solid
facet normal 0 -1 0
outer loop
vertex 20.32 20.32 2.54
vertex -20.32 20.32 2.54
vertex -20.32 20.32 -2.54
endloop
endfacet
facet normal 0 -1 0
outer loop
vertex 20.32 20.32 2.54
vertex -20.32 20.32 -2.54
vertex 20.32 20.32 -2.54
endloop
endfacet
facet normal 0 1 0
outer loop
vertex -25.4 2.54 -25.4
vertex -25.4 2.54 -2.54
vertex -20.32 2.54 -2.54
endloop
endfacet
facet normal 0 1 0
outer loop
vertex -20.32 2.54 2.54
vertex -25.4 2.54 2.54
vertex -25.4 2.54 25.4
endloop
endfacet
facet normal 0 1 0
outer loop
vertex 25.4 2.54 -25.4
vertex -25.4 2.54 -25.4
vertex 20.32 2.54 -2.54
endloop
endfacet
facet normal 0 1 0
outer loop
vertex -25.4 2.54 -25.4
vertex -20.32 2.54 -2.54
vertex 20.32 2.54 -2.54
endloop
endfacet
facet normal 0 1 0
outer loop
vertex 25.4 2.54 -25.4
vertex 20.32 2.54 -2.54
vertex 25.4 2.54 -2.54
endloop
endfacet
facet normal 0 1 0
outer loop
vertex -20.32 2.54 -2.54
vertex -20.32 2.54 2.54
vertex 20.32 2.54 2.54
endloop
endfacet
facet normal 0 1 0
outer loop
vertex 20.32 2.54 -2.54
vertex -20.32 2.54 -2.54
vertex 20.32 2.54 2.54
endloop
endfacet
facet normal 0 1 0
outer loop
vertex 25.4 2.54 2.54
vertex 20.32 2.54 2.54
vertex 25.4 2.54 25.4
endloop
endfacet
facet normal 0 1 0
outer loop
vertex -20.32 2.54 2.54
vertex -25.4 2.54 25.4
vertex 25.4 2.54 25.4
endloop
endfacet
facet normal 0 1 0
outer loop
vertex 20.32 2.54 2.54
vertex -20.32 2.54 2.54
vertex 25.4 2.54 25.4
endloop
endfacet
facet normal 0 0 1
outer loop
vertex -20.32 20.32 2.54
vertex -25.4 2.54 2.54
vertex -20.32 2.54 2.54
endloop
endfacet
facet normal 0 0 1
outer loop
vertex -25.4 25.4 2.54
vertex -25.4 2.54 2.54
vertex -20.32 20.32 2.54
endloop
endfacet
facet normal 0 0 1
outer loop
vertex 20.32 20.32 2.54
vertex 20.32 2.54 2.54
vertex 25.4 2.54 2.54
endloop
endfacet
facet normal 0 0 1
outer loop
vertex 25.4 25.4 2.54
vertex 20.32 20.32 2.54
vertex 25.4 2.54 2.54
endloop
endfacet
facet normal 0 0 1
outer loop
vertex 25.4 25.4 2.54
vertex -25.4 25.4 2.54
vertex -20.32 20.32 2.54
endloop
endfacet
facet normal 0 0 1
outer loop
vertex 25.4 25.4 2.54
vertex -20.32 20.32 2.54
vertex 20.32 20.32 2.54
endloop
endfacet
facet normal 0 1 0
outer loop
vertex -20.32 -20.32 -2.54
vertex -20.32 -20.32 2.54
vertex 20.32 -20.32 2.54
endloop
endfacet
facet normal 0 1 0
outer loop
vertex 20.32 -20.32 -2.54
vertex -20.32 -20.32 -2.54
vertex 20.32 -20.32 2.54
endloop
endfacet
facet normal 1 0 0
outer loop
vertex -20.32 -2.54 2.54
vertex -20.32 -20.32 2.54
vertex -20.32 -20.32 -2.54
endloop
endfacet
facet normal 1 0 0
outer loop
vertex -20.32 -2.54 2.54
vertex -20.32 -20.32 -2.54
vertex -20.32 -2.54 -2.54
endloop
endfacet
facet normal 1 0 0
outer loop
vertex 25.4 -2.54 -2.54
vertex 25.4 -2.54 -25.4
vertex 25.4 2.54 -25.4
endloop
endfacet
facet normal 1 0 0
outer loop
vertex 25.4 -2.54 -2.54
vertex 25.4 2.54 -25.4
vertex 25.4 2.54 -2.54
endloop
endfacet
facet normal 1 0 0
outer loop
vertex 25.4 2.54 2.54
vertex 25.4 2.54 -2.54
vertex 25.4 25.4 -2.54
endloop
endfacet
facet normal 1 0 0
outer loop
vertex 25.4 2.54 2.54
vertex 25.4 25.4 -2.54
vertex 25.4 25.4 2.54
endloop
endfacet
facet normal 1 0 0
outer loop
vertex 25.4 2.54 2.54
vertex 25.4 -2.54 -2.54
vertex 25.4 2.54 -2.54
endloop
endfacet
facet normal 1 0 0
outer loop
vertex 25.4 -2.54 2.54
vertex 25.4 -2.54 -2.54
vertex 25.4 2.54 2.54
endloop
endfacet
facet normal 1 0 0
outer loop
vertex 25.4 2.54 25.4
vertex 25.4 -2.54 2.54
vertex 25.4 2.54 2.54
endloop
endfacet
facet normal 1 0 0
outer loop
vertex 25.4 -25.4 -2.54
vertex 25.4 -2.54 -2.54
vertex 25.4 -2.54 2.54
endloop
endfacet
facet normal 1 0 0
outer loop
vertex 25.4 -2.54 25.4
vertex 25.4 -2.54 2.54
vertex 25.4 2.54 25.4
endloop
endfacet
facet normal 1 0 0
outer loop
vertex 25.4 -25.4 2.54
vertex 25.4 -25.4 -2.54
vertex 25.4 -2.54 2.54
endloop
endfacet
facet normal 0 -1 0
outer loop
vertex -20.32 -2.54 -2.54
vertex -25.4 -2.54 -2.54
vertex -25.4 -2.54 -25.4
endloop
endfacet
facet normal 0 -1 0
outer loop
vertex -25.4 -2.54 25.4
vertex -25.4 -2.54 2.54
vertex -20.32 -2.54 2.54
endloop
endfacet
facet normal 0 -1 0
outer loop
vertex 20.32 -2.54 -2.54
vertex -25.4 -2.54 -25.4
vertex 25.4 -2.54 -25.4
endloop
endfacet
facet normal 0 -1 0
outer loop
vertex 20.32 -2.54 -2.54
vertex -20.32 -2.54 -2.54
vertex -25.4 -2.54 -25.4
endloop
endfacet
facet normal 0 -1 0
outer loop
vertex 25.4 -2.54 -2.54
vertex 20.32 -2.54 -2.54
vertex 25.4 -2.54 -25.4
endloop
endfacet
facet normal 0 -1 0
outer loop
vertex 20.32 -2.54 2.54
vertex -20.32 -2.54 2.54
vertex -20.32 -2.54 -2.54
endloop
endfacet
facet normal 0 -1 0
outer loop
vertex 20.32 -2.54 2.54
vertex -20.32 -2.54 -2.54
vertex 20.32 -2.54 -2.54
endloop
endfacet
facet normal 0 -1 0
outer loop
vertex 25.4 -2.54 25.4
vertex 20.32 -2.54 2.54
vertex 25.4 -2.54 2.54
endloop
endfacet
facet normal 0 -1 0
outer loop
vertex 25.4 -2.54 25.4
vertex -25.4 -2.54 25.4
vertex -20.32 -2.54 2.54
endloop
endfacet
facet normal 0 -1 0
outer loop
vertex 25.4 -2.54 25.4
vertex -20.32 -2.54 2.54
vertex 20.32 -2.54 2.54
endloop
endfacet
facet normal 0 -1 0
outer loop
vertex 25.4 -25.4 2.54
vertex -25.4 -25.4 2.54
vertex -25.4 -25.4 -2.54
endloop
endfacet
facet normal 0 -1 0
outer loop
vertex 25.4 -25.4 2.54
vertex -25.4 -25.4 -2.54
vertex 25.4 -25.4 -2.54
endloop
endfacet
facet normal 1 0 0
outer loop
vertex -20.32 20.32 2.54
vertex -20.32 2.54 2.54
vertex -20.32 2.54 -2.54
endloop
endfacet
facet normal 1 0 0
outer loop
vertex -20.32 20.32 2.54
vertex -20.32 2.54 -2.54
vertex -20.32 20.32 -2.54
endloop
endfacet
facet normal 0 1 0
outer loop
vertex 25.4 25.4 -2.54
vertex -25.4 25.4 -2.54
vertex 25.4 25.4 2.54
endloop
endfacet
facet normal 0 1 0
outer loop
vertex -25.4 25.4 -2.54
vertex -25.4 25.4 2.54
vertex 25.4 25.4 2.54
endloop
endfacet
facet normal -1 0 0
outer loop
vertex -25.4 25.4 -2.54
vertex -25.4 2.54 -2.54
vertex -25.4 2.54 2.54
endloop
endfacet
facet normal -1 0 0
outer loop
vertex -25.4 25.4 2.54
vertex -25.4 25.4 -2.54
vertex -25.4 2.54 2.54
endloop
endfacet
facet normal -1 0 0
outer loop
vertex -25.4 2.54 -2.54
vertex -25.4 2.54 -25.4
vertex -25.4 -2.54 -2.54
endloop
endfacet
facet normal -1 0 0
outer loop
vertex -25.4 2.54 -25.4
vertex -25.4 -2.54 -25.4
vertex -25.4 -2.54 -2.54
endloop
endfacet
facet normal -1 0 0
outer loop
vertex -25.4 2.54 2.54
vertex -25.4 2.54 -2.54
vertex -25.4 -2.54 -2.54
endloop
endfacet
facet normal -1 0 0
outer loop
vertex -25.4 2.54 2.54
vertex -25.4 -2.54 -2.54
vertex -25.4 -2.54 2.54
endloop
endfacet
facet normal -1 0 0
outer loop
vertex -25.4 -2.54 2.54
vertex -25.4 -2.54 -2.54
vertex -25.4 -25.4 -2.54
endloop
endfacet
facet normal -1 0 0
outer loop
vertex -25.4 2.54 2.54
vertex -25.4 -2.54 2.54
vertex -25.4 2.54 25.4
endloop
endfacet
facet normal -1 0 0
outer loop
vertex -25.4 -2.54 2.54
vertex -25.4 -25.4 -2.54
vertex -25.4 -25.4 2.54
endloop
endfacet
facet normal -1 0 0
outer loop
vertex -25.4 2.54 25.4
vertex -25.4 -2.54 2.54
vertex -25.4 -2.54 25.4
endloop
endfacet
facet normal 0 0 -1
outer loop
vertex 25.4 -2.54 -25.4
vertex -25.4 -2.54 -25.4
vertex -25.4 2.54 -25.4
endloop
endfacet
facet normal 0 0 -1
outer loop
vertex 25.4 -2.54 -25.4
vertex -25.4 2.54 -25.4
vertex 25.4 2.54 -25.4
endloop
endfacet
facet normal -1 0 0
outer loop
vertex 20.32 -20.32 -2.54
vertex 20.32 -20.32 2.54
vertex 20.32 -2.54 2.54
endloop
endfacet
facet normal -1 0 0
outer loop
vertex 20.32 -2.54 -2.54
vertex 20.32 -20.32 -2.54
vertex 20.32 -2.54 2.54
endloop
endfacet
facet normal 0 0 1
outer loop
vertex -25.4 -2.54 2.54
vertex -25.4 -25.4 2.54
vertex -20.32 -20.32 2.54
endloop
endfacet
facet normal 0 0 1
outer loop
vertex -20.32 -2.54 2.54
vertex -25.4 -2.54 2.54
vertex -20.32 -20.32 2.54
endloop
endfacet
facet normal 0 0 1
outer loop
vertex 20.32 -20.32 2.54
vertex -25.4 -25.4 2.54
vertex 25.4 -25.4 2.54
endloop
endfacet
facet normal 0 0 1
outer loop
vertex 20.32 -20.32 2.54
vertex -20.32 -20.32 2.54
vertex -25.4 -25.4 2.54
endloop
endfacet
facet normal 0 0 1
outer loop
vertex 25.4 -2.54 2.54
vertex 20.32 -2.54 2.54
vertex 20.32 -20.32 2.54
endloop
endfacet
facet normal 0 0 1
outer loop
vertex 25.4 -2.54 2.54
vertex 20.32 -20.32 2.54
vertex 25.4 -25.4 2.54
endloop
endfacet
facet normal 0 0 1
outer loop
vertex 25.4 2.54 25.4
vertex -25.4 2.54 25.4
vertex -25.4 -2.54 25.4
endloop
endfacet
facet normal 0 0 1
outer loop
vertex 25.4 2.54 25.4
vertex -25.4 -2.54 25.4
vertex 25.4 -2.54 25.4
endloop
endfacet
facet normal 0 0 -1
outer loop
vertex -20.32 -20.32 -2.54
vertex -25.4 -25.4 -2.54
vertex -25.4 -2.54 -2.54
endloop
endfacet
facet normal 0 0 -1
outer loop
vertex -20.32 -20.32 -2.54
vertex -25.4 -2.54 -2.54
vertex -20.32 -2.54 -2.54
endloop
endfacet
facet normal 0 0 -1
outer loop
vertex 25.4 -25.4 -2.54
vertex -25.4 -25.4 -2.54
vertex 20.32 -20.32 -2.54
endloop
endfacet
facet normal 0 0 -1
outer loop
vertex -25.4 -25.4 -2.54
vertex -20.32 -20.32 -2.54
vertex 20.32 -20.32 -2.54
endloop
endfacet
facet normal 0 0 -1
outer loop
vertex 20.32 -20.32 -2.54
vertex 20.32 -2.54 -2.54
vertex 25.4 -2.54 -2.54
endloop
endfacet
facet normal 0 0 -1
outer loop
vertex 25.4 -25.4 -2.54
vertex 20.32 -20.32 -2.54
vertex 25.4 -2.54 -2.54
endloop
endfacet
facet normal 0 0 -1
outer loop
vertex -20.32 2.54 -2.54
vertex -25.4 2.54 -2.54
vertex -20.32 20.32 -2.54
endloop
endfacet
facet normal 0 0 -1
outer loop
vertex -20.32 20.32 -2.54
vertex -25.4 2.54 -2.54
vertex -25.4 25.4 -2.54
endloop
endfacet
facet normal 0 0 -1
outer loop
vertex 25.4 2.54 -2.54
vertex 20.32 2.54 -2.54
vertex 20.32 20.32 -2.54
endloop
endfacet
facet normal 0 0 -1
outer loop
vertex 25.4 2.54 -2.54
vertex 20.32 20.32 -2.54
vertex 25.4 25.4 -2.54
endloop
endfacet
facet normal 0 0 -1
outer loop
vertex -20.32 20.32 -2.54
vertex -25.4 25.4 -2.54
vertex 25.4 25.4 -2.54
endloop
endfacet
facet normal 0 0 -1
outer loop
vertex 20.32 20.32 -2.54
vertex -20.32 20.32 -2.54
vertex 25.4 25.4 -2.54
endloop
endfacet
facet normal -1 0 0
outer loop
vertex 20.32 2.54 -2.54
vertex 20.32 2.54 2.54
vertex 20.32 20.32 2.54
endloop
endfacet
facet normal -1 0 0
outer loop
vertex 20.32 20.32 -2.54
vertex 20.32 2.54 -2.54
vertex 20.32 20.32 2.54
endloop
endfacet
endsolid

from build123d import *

# Parameters (mm, degrees)
F0_W          = 50.8
F0_H          = 50.8
F1_DEPTH      = 2.54
F1_DEPTH_BACK = 2.54
F2_W          = 40.64
F2_H          = 40.64
F3_DEPTH      = 5.081
F4_W          = 50.8
F4_H          = 50.8
F5_DEPTH      = 2.54
F5_DEPTH_BACK = 2.54


with BuildPart() as f1:
    # F0 (on Top) → F1 (new body, two sides)
    with BuildSketch(Plane.XY) as f1_sk:
        Rectangle(F0_W, F0_H)
    extrude(amount=F1_DEPTH)
    extrude(f1_sk.sketch, amount=-F1_DEPTH_BACK)

    # F2 (on face) → F3 (cut, through all)
    with BuildSketch(Plane.XY.offset(2.54)):
        Rectangle(F2_W, F2_H)
    extrude(amount=-F3_DEPTH, mode=Mode.SUBTRACT)

    # F4 (on Front) → F5 (join, two sides)
    with BuildSketch(Plane.XZ) as f5_sk:
        Rectangle(F4_W, F4_H)
    extrude(amount=F5_DEPTH)
    extrude(f5_sk.sketch, amount=-F5_DEPTH_BACK)


solid = f1.part
